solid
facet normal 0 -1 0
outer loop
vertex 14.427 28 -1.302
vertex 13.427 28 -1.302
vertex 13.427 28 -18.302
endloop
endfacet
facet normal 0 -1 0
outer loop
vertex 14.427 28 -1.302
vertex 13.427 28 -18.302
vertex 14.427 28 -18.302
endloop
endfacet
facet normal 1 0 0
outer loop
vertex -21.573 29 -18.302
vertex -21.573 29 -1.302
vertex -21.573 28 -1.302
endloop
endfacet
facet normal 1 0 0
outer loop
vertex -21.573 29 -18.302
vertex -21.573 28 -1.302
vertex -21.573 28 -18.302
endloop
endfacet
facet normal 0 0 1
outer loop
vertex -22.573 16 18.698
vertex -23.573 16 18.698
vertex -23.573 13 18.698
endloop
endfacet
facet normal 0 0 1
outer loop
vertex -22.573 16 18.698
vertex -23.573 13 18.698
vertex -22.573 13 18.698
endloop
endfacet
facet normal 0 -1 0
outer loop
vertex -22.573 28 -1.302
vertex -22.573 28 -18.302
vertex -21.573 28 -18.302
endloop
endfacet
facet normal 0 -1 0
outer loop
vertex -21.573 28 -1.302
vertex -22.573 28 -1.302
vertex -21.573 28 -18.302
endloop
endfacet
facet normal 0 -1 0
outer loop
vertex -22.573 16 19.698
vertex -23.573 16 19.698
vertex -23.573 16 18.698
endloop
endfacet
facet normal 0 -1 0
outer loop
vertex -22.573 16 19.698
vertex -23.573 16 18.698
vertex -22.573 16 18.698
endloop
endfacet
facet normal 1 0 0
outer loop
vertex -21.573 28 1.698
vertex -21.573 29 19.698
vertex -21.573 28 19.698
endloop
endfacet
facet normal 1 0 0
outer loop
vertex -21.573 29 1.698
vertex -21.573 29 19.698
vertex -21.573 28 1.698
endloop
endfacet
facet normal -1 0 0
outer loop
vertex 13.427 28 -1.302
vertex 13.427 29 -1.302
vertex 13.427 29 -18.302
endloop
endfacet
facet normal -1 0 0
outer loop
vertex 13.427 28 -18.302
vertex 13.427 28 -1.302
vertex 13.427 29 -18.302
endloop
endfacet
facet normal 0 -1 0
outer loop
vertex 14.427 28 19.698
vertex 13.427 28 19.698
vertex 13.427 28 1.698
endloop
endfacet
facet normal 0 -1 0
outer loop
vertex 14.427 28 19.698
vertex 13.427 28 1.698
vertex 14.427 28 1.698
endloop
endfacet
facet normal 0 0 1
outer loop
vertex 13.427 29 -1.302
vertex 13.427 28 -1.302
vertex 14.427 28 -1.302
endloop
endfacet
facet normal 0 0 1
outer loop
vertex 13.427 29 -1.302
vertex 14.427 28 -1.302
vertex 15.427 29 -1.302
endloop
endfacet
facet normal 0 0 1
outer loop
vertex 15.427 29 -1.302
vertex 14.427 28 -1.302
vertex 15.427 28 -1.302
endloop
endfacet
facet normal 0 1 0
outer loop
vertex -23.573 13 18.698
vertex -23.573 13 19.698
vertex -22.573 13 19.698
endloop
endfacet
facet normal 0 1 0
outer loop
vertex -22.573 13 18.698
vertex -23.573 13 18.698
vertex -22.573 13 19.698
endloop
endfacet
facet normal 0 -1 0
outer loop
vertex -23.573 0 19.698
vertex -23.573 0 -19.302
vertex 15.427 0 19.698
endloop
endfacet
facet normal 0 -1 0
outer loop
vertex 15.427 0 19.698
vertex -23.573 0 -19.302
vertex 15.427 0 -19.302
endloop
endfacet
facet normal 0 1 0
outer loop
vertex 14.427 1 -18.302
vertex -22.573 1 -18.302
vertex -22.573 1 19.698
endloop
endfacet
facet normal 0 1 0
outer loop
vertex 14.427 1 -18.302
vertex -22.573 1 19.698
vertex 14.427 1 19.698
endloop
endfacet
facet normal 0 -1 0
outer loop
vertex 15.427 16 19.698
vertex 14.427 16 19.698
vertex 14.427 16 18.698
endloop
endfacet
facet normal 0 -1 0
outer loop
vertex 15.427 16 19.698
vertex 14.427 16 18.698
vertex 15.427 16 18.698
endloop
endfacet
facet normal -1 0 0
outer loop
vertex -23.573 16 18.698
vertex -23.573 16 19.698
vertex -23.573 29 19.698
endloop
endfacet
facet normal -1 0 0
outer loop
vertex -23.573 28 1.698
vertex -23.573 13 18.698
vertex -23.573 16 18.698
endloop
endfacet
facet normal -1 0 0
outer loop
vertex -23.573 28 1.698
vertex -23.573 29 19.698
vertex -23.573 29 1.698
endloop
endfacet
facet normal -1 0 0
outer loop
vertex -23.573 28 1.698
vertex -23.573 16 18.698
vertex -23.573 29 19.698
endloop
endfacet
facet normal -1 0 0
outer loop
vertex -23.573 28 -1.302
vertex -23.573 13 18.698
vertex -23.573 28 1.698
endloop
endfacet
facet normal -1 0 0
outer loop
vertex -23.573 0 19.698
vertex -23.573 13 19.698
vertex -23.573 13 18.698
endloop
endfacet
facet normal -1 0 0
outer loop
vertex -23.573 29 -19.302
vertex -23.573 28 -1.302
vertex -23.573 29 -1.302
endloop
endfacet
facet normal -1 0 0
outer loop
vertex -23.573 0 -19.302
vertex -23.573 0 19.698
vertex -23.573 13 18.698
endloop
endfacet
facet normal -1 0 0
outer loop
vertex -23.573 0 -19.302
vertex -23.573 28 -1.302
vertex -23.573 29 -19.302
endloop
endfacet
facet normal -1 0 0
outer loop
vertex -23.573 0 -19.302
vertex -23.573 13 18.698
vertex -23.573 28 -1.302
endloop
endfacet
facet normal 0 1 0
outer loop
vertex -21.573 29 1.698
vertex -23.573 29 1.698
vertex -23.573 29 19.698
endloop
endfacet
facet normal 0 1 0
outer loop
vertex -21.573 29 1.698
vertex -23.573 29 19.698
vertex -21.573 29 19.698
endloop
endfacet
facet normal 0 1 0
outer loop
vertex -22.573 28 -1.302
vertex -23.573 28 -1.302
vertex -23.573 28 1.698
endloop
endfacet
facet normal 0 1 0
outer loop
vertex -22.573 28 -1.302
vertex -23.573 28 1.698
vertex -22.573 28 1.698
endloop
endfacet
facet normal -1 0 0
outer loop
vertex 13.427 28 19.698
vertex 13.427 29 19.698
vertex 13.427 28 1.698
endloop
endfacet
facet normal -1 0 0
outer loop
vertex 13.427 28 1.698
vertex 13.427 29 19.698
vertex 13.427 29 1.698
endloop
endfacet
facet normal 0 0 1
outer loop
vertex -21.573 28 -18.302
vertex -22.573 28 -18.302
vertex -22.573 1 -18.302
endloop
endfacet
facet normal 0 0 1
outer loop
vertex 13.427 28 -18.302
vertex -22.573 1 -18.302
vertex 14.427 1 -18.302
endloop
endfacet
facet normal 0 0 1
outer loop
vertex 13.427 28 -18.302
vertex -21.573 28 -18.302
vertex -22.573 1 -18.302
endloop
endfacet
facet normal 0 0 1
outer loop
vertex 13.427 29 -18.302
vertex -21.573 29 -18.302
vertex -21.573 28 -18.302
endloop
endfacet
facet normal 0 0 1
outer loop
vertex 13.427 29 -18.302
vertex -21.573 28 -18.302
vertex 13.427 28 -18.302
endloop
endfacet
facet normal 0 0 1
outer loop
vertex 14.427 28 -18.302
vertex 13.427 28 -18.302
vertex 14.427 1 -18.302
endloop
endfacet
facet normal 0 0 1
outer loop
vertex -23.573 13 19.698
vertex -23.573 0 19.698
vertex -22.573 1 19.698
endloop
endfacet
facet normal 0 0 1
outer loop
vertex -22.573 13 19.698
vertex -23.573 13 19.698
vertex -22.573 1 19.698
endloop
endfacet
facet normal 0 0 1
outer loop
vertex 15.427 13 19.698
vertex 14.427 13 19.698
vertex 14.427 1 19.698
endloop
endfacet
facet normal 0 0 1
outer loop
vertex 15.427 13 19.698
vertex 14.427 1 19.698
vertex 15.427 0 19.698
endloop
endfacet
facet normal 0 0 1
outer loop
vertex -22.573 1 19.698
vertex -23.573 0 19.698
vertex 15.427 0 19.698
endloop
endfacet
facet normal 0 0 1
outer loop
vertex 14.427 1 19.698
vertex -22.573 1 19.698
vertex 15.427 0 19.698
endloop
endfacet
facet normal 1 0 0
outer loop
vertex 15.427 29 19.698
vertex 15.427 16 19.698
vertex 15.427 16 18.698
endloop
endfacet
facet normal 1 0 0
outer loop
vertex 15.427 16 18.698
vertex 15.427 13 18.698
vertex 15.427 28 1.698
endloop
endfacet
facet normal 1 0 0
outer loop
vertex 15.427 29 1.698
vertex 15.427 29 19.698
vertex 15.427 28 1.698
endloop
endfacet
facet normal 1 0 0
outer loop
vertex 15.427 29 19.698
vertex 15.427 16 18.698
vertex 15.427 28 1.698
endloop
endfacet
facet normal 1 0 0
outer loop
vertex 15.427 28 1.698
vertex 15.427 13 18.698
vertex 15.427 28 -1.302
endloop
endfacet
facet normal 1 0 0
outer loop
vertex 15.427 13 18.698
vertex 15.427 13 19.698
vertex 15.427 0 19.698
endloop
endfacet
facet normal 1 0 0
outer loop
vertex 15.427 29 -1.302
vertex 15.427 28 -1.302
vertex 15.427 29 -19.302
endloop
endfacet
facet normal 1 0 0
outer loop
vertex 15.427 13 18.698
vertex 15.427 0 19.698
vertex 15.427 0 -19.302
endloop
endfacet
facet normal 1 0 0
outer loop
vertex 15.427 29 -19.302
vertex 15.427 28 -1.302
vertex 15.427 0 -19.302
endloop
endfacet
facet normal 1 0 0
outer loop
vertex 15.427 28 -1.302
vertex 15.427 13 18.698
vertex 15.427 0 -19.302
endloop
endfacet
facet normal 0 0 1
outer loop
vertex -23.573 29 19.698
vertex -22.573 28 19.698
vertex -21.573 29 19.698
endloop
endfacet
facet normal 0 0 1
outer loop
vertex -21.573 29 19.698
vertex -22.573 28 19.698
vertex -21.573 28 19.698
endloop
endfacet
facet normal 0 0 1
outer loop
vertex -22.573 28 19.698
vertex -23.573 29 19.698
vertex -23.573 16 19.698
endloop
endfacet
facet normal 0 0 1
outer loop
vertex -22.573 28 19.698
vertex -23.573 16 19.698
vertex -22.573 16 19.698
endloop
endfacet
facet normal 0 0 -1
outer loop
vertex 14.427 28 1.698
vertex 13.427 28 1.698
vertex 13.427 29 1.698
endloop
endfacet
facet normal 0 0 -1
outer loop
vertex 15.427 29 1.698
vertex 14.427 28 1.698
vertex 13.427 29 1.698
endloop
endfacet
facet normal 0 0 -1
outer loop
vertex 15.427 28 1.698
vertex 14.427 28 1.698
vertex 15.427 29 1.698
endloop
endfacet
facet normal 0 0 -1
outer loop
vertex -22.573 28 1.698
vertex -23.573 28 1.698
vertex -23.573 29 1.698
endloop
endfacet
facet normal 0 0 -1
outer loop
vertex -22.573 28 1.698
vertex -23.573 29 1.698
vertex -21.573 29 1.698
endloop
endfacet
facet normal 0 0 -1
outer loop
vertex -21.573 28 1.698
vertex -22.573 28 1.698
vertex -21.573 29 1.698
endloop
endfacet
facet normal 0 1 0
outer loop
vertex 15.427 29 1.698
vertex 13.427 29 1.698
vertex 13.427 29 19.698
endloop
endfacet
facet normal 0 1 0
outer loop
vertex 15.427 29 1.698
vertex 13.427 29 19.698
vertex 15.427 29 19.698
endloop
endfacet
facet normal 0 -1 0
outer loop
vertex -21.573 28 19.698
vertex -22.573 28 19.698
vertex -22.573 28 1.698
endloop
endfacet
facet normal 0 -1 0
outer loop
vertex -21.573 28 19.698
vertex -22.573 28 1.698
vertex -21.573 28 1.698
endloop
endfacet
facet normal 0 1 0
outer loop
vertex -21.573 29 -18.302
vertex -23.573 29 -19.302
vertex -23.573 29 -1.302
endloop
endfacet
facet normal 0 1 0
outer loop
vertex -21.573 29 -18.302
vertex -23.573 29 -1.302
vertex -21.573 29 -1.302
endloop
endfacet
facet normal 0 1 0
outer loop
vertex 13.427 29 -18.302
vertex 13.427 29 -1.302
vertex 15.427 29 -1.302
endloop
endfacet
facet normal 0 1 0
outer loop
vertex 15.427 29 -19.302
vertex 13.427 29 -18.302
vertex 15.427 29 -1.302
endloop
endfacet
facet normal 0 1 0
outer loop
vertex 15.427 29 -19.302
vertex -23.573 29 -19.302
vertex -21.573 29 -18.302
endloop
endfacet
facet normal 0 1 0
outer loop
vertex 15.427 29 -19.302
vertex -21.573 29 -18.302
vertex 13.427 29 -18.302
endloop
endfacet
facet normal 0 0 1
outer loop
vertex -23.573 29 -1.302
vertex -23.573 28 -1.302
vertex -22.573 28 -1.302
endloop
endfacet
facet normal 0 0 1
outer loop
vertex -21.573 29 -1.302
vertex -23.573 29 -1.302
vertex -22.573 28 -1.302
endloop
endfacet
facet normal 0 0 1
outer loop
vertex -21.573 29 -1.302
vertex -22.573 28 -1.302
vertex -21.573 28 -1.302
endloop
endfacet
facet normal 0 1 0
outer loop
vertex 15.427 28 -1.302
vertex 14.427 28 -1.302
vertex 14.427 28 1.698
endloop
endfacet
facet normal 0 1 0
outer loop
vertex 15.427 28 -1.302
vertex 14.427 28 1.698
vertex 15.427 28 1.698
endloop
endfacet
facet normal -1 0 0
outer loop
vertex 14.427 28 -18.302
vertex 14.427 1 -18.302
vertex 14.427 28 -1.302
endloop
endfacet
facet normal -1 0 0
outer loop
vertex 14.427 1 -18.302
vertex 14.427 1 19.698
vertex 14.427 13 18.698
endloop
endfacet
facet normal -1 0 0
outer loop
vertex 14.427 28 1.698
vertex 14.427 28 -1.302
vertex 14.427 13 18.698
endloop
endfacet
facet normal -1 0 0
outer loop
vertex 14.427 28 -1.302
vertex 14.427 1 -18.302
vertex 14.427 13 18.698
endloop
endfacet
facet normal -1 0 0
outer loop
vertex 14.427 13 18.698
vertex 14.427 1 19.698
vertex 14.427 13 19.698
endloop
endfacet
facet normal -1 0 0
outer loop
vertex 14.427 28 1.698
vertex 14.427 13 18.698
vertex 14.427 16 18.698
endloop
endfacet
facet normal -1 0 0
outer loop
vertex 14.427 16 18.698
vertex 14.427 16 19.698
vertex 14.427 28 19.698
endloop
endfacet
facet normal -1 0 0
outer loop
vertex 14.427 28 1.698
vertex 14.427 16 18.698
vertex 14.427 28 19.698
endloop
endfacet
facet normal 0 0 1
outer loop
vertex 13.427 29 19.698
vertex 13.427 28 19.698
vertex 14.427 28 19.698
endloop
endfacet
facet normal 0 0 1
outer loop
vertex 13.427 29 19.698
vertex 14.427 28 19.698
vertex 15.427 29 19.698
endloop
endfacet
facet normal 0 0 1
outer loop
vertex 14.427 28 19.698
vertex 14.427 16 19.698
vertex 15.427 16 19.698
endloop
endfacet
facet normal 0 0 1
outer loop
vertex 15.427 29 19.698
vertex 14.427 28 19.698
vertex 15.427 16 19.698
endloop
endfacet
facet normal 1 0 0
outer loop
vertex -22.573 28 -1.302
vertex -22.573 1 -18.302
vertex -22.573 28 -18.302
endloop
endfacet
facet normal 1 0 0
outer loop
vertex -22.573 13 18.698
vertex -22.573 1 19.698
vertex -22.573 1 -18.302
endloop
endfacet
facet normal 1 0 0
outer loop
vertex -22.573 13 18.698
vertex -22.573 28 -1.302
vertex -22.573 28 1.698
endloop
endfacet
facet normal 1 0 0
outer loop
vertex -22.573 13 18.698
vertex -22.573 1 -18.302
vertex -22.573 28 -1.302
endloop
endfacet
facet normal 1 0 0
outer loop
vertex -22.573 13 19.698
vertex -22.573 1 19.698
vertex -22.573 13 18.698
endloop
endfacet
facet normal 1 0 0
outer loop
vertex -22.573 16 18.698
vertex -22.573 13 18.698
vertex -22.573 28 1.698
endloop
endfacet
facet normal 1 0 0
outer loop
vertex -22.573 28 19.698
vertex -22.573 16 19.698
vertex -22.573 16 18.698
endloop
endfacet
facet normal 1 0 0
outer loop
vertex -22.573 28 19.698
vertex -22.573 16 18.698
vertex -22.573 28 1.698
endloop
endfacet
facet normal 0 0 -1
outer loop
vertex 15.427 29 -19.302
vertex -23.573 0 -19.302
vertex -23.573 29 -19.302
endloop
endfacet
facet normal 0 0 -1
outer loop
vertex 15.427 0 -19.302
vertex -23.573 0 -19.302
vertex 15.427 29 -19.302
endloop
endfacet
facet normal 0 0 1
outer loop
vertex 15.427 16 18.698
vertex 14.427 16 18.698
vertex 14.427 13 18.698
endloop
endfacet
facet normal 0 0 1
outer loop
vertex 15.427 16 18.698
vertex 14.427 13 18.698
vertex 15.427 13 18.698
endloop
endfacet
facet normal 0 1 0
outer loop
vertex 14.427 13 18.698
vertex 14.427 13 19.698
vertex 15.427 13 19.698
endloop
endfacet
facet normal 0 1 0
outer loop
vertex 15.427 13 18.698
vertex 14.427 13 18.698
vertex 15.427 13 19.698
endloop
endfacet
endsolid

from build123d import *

# Parameters (mm, degrees)
SKETCH1_W           = 39
SKETCH1_H           = 39
BOSS_EXTRUDE1_DEPTH = 29
SKETCH3_W           = 37
SKETCH3_H           = 27
CUT_EXTRUDE1_DEPTH  = 38
SKETCH4_W           = 35
SKETCH4_H           = 38.588060521
CUT_EXTRUDE2_DEPTH  = 10
CUT_EXTRUDE3_START  = 27
SKETCH5_W           = 40
SKETCH5_H           = 3
CUT_EXTRUDE3_DEPTH  = 4
CUT_EXTRUDE5_START  = 38
SKETCH6_W           = 41.777462506
SKETCH6_H           = 3
CUT_EXTRUDE5_DEPTH  = 1


with BuildPart() as part:
    # Sketch1 → Boss-Extrude1 (new body)
    with BuildSketch(Plane(origin=(0, 0, 0), x_dir=(1, 0, 0), z_dir=(0, 1, 0))):
        with Locations((-4.072718242, -0.197565543)):
            Rectangle(SKETCH1_W, SKETCH1_H)
    extrude(amount=BOSS_EXTRUDE1_DEPTH)

    # Sketch3 → Cut-Extrude1 (cut)
    with BuildSketch(Plane.XY.offset(19.697565543)):
        with Locations((-4.072718242, 14.5)):
            Rectangle(SKETCH3_W, SKETCH3_H)
    extrude(amount=-CUT_EXTRUDE1_DEPTH, mode=Mode.SUBTRACT)

    # Sketch4 → Cut-Extrude2 (cut)
    with BuildSketch(Plane(origin=(0, 29, 0), x_dir=(1, 0, 0), z_dir=(0, 1, 0))):
        with Locations((-4.072718242, -0.991595804)):
            Rectangle(SKETCH4_W, SKETCH4_H)
    extrude(amount=-CUT_EXTRUDE2_DEPTH, mode=Mode.SUBTRACT)

    # Sketch5 → Cut-Extrude3 (cut)
    with BuildSketch(Plane(origin=(0, 1, 0), x_dir=(1, 0, 0), z_dir=(0, 1, 0)).offset(CUT_EXTRUDE3_START)):
        with Locations((-4.288618926, -0.197565543)):
            Rectangle(SKETCH5_W, SKETCH5_H)
    extrude(amount=CUT_EXTRUDE3_DEPTH, mode=Mode.SUBTRACT)

    # Sketch6 → Cut-Extrude5 (cut)
    with BuildSketch(Plane.XY.offset(-18.302434457).offset(CUT_EXTRUDE5_START)):
        with Locations((-4.415990597, 14.5)):
            Rectangle(SKETCH6_W, SKETCH6_H)
    extrude(amount=-CUT_EXTRUDE5_DEPTH, mode=Mode.SUBTRACT)


solid = part.part
